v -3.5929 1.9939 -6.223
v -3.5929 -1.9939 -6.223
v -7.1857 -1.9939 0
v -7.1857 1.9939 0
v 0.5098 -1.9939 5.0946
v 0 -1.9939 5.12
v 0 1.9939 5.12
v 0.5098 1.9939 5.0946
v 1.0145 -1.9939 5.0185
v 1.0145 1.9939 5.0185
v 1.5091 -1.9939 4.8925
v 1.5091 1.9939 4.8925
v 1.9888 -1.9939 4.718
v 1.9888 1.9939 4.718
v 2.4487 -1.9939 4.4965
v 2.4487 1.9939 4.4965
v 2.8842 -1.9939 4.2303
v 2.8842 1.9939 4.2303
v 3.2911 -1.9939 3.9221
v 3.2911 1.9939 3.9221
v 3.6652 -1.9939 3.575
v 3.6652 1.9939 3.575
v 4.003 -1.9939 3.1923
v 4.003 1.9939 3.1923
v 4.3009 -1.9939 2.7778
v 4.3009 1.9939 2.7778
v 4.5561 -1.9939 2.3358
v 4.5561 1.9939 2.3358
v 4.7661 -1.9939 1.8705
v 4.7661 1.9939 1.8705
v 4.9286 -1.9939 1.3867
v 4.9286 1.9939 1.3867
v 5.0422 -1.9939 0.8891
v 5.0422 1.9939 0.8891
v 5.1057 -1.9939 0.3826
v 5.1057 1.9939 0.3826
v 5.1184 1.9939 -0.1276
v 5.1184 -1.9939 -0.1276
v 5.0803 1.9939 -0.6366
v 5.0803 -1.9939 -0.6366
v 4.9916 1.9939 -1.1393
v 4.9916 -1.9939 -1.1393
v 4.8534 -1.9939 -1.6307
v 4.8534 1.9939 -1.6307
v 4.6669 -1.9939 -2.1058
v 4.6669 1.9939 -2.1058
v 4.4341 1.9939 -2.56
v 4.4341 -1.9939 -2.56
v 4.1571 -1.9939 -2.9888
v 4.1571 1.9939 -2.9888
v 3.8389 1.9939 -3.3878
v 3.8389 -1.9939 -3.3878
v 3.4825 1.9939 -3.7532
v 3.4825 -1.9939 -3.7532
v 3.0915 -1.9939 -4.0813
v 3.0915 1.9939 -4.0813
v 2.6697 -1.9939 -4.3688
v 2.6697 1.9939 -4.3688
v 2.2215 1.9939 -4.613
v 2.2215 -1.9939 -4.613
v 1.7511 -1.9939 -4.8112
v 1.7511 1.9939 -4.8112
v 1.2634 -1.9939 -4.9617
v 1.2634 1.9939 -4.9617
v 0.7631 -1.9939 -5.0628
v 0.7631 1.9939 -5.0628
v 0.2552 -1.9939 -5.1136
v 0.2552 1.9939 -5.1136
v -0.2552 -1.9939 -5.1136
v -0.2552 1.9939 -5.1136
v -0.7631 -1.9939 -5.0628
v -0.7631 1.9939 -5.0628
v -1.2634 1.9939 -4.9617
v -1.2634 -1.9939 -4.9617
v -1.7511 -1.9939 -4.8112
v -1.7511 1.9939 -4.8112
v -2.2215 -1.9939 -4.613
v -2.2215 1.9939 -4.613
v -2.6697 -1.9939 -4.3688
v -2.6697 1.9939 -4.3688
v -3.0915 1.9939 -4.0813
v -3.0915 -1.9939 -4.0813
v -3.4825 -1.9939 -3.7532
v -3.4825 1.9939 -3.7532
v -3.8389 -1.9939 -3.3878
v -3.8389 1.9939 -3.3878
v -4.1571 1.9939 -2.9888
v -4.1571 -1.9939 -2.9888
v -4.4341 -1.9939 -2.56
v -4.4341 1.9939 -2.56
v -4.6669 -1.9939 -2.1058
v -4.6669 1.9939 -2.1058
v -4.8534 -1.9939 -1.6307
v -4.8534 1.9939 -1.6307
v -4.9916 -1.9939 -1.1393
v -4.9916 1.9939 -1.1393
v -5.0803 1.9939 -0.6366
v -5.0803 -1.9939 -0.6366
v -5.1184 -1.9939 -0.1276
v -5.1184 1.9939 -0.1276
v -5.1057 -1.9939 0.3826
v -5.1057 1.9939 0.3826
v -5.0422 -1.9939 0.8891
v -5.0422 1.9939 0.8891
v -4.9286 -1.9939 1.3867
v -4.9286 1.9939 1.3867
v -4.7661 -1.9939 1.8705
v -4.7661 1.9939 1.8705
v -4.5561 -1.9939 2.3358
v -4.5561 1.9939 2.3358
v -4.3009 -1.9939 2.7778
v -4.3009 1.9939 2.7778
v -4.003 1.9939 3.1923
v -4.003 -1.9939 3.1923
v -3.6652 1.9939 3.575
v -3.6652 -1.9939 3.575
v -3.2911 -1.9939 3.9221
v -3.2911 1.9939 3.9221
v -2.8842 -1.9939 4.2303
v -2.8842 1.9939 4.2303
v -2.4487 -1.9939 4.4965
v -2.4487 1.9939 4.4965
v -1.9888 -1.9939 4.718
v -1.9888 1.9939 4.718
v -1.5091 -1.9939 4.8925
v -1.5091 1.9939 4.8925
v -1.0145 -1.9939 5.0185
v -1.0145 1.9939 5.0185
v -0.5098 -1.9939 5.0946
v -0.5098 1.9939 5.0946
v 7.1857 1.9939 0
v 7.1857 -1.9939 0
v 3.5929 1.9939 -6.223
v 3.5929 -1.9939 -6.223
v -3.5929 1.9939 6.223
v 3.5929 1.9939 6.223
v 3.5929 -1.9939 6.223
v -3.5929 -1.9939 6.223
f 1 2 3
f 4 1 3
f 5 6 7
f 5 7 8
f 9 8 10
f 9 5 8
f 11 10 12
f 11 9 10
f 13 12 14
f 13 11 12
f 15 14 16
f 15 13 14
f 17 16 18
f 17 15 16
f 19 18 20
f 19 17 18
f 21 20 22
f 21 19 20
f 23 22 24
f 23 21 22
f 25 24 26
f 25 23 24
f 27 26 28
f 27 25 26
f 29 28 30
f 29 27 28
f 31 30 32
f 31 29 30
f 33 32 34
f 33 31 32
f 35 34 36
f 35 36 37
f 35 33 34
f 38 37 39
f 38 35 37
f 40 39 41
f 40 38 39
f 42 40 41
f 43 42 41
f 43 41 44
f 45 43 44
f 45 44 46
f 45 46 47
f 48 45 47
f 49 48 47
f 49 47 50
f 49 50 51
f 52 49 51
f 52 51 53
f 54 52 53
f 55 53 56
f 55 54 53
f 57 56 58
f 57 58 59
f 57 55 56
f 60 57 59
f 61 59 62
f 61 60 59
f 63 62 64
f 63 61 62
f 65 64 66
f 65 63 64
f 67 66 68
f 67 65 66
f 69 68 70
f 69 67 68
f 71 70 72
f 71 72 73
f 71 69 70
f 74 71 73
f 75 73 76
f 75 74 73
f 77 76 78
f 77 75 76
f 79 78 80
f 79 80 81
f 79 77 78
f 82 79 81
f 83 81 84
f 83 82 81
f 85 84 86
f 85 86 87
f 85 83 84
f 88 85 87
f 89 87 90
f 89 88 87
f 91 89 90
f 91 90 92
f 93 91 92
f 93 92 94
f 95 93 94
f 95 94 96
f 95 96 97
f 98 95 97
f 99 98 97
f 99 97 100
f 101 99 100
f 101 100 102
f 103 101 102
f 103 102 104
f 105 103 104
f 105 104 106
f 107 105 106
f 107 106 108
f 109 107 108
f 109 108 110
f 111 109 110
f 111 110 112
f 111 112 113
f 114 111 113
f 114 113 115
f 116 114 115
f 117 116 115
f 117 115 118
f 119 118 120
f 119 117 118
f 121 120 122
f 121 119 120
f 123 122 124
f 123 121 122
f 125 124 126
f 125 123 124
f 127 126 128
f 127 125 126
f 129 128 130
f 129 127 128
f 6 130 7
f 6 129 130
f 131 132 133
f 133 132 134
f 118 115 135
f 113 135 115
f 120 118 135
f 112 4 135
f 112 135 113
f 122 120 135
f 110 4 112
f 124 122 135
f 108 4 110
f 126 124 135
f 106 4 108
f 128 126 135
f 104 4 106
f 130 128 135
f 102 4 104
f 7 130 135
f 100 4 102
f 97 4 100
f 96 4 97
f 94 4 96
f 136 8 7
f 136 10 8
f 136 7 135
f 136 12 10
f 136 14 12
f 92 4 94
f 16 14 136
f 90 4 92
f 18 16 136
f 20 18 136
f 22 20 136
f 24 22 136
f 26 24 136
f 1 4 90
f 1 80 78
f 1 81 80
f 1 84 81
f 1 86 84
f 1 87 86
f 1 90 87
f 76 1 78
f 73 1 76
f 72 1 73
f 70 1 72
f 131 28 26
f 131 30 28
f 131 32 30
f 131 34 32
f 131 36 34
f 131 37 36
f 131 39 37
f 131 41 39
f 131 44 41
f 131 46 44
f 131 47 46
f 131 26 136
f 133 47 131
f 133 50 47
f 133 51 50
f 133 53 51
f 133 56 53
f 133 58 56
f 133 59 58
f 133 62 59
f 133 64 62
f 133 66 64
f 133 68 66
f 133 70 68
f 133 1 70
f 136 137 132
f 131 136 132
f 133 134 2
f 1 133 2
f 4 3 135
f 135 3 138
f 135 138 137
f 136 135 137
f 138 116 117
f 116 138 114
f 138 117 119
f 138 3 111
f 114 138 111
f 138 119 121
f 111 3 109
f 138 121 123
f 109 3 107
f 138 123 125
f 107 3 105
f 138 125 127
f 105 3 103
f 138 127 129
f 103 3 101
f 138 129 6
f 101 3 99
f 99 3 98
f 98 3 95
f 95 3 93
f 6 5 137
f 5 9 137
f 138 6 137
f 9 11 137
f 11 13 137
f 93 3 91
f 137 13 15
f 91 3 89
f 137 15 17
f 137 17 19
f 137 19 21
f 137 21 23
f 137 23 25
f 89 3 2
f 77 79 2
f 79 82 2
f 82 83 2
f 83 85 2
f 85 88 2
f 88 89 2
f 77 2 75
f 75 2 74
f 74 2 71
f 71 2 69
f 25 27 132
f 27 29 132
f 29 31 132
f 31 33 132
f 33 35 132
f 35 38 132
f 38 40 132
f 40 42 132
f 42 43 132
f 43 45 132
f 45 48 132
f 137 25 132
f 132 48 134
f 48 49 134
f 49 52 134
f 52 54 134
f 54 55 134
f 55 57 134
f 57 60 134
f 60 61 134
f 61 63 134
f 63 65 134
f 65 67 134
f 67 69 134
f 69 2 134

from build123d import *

# Parameters (mm, degrees)
BOSS_EXTRUDE1_DEPTH      = 1.9939
BOSS_EXTRUDE1_DEPTH_BACK = 1.9939
SKETCH1_R                = 5.12


with BuildPart() as part:
    # Sketch1 → Boss-Extrude1 (new, two sides: drawn at the far end of the back side and taken through both)
    with BuildSketch(Plane(origin=(0, 0, 0), x_dir=(1, 0, 0), z_dir=(0, 1, 0)).offset(-BOSS_EXTRUDE1_DEPTH_BACK)):
        Polygon((-3.592850725, 6.223), (-7.18570145, 0), (-3.592850725, -6.223), (3.592850725, -6.223), (7.18570145, 0), (3.592850725, 6.223), align=None)
        Circle(SKETCH1_R, mode=Mode.SUBTRACT)
    extrude(amount=BOSS_EXTRUDE1_DEPTH + BOSS_EXTRUDE1_DEPTH_BACK)


solid = part.part
